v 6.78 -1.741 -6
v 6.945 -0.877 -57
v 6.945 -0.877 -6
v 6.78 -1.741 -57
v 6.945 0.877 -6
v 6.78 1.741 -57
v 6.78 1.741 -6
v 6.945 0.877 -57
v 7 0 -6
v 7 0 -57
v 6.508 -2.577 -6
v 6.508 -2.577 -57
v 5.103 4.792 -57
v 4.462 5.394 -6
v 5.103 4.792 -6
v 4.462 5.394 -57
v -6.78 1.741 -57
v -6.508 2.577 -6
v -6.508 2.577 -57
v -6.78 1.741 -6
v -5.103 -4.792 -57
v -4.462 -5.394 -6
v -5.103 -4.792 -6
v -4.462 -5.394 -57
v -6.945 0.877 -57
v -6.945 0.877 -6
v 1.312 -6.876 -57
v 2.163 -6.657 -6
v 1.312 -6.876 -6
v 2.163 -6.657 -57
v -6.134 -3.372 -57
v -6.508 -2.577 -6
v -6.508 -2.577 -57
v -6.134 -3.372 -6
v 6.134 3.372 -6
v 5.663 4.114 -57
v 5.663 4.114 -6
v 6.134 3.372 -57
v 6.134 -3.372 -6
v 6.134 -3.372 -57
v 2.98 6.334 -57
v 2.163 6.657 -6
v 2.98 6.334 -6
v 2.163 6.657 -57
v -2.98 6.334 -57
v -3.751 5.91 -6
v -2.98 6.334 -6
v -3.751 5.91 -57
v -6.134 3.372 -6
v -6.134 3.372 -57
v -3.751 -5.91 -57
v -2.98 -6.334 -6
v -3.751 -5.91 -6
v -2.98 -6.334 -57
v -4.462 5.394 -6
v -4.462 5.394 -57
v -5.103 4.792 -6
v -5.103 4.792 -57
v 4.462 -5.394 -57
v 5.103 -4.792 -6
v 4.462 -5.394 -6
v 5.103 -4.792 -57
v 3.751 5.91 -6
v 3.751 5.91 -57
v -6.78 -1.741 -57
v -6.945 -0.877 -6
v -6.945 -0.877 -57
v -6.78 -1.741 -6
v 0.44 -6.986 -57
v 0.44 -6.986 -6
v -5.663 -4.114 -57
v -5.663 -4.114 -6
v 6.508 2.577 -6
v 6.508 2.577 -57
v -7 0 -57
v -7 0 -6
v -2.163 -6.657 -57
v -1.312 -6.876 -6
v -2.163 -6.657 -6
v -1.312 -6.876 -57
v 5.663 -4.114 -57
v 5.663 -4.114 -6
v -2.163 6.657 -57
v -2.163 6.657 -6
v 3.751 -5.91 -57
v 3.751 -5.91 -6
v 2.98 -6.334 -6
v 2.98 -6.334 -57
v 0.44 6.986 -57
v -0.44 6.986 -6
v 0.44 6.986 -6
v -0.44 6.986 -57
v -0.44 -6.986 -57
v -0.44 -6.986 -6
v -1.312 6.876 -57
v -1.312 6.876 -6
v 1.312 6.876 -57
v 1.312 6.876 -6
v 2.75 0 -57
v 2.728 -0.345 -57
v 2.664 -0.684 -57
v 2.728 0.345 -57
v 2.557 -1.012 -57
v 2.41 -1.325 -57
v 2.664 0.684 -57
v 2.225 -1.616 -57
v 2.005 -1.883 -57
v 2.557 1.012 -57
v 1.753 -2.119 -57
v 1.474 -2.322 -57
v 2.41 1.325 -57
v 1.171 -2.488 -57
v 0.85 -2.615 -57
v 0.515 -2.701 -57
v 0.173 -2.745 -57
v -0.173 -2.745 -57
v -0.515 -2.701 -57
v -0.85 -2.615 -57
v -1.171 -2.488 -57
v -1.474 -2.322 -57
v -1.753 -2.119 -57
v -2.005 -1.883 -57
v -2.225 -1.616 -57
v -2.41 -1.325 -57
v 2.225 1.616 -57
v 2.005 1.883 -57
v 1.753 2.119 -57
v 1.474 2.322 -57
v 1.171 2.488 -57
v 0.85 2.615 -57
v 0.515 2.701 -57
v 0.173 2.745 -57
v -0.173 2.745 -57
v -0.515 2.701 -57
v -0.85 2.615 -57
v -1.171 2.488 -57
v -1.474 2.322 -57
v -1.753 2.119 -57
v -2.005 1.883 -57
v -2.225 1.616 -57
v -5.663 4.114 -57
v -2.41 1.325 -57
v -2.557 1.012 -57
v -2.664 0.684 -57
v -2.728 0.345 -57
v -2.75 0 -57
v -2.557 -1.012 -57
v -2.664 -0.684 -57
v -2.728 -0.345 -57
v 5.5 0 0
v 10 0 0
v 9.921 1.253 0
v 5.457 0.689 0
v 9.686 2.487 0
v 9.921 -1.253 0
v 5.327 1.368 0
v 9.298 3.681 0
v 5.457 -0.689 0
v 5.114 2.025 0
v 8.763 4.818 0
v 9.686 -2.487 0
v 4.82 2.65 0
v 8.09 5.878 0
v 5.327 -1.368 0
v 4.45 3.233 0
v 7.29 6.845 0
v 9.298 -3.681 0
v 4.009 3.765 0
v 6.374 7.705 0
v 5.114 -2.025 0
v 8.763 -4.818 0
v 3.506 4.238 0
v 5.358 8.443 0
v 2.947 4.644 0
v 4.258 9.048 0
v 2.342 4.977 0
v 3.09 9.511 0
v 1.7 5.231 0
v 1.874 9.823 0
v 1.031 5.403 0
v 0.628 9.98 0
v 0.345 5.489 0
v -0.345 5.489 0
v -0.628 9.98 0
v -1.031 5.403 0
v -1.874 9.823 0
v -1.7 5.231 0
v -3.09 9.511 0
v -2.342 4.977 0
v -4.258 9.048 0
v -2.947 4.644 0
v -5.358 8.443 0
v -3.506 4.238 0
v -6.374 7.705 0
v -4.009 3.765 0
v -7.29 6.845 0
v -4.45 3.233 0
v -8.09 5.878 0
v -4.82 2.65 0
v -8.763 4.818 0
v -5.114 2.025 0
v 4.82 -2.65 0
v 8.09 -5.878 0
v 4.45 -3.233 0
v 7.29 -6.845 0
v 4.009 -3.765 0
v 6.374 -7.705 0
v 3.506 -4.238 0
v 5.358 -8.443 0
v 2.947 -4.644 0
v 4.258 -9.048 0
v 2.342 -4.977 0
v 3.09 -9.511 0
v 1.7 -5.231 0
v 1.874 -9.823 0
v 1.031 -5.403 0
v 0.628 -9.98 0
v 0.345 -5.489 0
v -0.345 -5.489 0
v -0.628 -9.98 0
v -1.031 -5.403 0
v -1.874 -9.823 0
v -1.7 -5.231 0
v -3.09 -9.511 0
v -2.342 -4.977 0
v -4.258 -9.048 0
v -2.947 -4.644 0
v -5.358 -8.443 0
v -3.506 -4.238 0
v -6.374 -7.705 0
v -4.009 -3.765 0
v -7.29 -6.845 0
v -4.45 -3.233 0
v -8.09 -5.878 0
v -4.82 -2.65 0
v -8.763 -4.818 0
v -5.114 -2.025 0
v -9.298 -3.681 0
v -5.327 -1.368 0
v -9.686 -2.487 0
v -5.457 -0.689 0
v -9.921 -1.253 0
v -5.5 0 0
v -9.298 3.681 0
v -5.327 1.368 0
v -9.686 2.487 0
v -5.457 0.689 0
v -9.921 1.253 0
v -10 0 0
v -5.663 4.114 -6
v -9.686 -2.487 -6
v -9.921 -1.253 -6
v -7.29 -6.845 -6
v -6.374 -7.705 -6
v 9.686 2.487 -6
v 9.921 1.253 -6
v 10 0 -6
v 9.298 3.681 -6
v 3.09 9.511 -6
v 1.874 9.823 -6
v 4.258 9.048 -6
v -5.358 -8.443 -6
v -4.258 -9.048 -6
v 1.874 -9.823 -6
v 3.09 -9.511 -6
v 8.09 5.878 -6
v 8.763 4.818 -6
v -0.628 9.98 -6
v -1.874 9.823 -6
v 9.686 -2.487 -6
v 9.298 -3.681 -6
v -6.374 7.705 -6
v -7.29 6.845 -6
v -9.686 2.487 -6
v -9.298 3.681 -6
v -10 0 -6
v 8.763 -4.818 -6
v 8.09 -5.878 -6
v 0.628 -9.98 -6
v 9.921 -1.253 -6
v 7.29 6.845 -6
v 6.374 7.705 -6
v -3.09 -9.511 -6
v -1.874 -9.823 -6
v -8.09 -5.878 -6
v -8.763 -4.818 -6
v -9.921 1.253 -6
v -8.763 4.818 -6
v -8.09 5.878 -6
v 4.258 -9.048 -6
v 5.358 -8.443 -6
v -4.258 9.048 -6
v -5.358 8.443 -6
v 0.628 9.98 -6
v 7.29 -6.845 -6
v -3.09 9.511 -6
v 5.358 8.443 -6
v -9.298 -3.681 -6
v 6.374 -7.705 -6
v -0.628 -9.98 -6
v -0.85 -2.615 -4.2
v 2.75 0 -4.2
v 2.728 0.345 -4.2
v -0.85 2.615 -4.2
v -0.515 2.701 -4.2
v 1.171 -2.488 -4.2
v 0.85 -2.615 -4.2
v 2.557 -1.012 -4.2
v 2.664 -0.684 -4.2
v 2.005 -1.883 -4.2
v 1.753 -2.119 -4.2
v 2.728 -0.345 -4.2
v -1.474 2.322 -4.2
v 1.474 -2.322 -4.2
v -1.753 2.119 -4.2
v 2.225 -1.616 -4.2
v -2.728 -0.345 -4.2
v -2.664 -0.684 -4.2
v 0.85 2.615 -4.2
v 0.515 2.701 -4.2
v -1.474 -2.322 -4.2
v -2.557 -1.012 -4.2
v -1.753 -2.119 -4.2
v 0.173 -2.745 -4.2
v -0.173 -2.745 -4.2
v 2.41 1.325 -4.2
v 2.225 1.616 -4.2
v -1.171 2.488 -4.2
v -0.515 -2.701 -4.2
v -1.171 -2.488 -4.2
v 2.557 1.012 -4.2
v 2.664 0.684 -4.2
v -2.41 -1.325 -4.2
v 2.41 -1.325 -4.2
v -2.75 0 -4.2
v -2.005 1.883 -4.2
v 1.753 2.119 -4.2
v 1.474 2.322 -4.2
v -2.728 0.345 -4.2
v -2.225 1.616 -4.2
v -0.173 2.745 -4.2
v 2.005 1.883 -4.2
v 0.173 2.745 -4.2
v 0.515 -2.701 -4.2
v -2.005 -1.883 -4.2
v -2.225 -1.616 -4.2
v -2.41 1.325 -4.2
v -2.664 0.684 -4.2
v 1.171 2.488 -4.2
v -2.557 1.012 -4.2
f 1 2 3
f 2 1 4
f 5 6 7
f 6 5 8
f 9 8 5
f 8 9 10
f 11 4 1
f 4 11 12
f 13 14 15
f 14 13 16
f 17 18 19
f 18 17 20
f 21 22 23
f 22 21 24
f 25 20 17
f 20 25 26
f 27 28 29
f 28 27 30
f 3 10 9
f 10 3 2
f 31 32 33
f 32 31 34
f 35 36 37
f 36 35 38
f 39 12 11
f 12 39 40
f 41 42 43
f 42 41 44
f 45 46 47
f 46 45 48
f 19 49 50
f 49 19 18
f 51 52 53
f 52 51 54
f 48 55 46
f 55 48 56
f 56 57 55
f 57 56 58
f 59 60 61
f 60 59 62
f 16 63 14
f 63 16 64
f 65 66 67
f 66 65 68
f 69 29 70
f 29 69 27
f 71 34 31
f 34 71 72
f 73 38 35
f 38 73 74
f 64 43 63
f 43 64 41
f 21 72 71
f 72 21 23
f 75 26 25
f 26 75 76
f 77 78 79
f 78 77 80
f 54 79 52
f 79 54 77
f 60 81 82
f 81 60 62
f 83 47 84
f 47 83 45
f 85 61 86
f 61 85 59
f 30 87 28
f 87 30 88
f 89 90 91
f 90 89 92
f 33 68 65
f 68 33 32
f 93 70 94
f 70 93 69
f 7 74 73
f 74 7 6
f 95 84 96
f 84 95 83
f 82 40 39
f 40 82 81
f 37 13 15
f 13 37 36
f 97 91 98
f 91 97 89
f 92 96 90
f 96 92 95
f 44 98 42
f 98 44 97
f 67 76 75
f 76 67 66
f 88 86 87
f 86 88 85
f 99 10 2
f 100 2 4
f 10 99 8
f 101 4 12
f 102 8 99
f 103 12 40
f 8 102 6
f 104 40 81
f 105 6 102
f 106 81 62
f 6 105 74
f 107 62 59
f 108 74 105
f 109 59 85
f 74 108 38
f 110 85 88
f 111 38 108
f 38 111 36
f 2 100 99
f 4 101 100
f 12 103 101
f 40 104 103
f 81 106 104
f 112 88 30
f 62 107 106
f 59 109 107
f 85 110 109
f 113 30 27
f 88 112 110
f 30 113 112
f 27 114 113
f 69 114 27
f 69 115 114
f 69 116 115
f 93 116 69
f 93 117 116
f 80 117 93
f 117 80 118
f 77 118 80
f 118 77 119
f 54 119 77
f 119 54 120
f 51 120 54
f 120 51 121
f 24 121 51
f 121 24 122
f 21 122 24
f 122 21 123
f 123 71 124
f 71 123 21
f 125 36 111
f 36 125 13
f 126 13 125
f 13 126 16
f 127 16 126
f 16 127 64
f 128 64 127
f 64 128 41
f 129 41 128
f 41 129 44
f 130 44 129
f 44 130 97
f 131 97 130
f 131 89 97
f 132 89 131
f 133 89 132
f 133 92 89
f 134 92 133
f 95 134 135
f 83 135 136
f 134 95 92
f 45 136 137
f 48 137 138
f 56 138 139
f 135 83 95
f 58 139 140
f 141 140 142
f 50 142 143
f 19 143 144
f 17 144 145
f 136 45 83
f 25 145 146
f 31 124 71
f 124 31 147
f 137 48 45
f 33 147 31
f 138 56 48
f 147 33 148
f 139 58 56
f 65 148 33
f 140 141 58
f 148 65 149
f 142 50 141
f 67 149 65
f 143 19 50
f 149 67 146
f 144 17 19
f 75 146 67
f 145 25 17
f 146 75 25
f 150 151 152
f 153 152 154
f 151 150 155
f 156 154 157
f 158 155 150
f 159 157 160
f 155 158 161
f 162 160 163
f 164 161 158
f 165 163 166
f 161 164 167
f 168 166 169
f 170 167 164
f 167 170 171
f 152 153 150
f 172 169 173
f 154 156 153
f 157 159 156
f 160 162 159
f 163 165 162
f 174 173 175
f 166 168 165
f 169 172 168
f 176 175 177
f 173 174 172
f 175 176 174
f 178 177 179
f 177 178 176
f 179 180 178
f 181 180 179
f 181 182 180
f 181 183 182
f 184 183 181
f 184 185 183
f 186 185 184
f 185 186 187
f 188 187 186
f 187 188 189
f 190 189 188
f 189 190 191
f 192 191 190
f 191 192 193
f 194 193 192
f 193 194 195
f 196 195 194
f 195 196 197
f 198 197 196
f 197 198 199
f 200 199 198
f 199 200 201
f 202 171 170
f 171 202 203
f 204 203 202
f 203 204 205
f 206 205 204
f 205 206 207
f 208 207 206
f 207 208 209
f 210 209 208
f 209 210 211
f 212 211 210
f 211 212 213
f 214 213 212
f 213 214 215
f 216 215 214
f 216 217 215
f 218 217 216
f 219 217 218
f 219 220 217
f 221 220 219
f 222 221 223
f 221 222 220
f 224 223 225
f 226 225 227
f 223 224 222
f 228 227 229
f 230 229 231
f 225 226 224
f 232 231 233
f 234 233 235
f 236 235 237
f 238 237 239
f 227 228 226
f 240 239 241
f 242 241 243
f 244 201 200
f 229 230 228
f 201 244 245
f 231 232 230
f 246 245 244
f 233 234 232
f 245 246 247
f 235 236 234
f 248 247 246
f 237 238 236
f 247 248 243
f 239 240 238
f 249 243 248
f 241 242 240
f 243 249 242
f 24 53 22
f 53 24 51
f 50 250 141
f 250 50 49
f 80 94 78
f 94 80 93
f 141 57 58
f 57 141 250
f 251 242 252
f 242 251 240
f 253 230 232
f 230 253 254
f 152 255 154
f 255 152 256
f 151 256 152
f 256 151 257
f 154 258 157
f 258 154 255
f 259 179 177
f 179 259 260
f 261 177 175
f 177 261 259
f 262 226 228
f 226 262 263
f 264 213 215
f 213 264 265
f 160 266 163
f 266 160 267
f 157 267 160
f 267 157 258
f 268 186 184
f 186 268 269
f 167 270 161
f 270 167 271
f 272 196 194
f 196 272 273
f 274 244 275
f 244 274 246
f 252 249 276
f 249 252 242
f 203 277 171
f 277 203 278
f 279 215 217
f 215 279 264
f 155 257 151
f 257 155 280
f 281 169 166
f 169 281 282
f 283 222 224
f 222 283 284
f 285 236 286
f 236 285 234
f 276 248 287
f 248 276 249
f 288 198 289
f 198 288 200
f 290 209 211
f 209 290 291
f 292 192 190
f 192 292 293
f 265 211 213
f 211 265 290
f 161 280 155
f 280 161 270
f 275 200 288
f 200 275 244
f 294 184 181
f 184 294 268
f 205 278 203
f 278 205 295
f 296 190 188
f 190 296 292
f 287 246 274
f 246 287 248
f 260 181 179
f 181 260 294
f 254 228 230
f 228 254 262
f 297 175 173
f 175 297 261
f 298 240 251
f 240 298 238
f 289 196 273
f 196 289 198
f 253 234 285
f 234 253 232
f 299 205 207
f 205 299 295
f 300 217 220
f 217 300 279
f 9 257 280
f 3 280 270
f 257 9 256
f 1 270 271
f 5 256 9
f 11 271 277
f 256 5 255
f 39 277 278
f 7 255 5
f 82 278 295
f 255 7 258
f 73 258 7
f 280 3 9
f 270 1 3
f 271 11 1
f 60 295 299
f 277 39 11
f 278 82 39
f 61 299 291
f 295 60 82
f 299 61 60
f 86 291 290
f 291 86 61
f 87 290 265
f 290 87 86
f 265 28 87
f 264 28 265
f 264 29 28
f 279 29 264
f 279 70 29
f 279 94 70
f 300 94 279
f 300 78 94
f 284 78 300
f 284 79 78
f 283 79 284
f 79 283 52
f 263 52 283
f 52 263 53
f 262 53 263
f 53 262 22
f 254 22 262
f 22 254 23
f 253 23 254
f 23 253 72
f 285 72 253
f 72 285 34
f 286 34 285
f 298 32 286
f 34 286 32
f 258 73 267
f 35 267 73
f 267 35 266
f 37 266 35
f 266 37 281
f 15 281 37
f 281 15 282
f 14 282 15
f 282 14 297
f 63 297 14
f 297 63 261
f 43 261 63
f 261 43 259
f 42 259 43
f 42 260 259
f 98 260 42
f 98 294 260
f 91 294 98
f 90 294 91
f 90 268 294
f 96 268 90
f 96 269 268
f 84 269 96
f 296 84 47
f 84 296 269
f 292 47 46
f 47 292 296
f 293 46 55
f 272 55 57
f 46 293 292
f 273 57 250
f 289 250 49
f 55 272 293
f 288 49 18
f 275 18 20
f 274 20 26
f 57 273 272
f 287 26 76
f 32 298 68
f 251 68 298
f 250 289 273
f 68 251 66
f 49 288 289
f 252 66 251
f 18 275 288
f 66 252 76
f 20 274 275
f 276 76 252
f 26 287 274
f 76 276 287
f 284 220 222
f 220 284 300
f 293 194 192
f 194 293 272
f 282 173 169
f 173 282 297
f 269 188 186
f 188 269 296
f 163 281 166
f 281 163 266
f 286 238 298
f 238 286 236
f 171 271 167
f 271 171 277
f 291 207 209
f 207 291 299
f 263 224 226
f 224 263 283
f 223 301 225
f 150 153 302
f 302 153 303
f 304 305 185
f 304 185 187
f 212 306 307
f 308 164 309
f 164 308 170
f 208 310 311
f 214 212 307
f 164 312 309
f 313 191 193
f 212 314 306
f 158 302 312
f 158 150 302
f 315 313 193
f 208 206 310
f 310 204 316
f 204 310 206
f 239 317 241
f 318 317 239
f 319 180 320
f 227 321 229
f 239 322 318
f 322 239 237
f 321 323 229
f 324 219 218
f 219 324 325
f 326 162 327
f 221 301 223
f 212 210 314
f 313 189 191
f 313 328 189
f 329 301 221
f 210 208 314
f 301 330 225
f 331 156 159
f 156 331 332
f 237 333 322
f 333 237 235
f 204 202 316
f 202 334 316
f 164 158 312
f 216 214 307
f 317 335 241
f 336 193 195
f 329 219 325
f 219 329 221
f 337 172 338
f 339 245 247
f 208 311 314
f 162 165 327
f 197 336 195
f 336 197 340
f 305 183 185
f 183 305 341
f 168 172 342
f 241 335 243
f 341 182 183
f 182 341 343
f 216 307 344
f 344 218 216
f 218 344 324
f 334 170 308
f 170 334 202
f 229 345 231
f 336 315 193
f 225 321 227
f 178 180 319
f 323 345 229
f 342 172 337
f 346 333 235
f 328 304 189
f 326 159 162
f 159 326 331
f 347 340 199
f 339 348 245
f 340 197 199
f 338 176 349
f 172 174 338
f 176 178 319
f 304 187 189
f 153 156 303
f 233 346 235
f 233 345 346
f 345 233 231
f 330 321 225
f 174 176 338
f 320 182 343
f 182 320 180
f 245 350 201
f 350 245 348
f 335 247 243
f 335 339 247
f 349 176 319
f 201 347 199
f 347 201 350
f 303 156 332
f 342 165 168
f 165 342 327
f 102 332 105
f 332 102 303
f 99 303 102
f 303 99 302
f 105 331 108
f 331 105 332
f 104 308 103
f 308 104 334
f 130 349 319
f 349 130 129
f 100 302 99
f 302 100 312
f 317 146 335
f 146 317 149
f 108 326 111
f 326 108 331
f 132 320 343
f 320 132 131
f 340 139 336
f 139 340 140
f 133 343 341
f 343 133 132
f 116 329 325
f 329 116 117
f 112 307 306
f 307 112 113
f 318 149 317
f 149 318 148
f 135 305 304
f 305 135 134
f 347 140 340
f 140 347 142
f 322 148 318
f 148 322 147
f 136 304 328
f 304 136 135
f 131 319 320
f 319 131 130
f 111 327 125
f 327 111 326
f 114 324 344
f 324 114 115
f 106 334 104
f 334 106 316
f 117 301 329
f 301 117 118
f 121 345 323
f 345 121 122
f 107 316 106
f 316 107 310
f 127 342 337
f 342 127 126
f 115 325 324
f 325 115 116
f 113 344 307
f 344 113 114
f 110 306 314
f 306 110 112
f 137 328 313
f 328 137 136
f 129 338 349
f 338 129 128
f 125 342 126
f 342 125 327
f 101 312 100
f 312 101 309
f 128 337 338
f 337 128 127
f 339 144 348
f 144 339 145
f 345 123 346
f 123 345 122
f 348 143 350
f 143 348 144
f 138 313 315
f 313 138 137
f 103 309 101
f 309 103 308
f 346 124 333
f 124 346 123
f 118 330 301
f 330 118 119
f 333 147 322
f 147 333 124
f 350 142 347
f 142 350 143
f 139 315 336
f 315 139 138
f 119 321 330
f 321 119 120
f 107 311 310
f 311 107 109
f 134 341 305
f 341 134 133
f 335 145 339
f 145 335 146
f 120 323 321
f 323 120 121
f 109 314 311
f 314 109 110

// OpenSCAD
$fn = 50;


difference() {
	union() {
		translate(v = [0, 0, -57.0000000000]) {
			cylinder(h = 57, r = 7.0000000000);
		}
		translate(v = [0, 0, -6.0000000000]) {
			cylinder(h = 6, r = 10.0000000000);
		}
	}
	union() {
		translate(v = [0, 0, 0]) {
			rotate(a = [0, 0, 0]) {
				difference() {
					union() {
						#translate(v = [0, 0, -57.0000000000]) {
							cylinder(h = 57, r = 2.2500000000);
						}
						#translate(v = [0, 0, -4.2000000000]) {
							cylinder(h = 4.2000000000, r = 7.0000000000, r1 = 2.7500000000, r2 = 5.5000000000);
						}
						#translate(v = [0, 0, -57.0000000000]) {
							cylinder(h = 57, r = 2.7500000000);
						}
						#translate(v = [0, 0, -57.0000000000]) {
							cylinder(h = 57, r = 2.2500000000);
						}
					}
					union();
				}
			}
		}
	}
}
